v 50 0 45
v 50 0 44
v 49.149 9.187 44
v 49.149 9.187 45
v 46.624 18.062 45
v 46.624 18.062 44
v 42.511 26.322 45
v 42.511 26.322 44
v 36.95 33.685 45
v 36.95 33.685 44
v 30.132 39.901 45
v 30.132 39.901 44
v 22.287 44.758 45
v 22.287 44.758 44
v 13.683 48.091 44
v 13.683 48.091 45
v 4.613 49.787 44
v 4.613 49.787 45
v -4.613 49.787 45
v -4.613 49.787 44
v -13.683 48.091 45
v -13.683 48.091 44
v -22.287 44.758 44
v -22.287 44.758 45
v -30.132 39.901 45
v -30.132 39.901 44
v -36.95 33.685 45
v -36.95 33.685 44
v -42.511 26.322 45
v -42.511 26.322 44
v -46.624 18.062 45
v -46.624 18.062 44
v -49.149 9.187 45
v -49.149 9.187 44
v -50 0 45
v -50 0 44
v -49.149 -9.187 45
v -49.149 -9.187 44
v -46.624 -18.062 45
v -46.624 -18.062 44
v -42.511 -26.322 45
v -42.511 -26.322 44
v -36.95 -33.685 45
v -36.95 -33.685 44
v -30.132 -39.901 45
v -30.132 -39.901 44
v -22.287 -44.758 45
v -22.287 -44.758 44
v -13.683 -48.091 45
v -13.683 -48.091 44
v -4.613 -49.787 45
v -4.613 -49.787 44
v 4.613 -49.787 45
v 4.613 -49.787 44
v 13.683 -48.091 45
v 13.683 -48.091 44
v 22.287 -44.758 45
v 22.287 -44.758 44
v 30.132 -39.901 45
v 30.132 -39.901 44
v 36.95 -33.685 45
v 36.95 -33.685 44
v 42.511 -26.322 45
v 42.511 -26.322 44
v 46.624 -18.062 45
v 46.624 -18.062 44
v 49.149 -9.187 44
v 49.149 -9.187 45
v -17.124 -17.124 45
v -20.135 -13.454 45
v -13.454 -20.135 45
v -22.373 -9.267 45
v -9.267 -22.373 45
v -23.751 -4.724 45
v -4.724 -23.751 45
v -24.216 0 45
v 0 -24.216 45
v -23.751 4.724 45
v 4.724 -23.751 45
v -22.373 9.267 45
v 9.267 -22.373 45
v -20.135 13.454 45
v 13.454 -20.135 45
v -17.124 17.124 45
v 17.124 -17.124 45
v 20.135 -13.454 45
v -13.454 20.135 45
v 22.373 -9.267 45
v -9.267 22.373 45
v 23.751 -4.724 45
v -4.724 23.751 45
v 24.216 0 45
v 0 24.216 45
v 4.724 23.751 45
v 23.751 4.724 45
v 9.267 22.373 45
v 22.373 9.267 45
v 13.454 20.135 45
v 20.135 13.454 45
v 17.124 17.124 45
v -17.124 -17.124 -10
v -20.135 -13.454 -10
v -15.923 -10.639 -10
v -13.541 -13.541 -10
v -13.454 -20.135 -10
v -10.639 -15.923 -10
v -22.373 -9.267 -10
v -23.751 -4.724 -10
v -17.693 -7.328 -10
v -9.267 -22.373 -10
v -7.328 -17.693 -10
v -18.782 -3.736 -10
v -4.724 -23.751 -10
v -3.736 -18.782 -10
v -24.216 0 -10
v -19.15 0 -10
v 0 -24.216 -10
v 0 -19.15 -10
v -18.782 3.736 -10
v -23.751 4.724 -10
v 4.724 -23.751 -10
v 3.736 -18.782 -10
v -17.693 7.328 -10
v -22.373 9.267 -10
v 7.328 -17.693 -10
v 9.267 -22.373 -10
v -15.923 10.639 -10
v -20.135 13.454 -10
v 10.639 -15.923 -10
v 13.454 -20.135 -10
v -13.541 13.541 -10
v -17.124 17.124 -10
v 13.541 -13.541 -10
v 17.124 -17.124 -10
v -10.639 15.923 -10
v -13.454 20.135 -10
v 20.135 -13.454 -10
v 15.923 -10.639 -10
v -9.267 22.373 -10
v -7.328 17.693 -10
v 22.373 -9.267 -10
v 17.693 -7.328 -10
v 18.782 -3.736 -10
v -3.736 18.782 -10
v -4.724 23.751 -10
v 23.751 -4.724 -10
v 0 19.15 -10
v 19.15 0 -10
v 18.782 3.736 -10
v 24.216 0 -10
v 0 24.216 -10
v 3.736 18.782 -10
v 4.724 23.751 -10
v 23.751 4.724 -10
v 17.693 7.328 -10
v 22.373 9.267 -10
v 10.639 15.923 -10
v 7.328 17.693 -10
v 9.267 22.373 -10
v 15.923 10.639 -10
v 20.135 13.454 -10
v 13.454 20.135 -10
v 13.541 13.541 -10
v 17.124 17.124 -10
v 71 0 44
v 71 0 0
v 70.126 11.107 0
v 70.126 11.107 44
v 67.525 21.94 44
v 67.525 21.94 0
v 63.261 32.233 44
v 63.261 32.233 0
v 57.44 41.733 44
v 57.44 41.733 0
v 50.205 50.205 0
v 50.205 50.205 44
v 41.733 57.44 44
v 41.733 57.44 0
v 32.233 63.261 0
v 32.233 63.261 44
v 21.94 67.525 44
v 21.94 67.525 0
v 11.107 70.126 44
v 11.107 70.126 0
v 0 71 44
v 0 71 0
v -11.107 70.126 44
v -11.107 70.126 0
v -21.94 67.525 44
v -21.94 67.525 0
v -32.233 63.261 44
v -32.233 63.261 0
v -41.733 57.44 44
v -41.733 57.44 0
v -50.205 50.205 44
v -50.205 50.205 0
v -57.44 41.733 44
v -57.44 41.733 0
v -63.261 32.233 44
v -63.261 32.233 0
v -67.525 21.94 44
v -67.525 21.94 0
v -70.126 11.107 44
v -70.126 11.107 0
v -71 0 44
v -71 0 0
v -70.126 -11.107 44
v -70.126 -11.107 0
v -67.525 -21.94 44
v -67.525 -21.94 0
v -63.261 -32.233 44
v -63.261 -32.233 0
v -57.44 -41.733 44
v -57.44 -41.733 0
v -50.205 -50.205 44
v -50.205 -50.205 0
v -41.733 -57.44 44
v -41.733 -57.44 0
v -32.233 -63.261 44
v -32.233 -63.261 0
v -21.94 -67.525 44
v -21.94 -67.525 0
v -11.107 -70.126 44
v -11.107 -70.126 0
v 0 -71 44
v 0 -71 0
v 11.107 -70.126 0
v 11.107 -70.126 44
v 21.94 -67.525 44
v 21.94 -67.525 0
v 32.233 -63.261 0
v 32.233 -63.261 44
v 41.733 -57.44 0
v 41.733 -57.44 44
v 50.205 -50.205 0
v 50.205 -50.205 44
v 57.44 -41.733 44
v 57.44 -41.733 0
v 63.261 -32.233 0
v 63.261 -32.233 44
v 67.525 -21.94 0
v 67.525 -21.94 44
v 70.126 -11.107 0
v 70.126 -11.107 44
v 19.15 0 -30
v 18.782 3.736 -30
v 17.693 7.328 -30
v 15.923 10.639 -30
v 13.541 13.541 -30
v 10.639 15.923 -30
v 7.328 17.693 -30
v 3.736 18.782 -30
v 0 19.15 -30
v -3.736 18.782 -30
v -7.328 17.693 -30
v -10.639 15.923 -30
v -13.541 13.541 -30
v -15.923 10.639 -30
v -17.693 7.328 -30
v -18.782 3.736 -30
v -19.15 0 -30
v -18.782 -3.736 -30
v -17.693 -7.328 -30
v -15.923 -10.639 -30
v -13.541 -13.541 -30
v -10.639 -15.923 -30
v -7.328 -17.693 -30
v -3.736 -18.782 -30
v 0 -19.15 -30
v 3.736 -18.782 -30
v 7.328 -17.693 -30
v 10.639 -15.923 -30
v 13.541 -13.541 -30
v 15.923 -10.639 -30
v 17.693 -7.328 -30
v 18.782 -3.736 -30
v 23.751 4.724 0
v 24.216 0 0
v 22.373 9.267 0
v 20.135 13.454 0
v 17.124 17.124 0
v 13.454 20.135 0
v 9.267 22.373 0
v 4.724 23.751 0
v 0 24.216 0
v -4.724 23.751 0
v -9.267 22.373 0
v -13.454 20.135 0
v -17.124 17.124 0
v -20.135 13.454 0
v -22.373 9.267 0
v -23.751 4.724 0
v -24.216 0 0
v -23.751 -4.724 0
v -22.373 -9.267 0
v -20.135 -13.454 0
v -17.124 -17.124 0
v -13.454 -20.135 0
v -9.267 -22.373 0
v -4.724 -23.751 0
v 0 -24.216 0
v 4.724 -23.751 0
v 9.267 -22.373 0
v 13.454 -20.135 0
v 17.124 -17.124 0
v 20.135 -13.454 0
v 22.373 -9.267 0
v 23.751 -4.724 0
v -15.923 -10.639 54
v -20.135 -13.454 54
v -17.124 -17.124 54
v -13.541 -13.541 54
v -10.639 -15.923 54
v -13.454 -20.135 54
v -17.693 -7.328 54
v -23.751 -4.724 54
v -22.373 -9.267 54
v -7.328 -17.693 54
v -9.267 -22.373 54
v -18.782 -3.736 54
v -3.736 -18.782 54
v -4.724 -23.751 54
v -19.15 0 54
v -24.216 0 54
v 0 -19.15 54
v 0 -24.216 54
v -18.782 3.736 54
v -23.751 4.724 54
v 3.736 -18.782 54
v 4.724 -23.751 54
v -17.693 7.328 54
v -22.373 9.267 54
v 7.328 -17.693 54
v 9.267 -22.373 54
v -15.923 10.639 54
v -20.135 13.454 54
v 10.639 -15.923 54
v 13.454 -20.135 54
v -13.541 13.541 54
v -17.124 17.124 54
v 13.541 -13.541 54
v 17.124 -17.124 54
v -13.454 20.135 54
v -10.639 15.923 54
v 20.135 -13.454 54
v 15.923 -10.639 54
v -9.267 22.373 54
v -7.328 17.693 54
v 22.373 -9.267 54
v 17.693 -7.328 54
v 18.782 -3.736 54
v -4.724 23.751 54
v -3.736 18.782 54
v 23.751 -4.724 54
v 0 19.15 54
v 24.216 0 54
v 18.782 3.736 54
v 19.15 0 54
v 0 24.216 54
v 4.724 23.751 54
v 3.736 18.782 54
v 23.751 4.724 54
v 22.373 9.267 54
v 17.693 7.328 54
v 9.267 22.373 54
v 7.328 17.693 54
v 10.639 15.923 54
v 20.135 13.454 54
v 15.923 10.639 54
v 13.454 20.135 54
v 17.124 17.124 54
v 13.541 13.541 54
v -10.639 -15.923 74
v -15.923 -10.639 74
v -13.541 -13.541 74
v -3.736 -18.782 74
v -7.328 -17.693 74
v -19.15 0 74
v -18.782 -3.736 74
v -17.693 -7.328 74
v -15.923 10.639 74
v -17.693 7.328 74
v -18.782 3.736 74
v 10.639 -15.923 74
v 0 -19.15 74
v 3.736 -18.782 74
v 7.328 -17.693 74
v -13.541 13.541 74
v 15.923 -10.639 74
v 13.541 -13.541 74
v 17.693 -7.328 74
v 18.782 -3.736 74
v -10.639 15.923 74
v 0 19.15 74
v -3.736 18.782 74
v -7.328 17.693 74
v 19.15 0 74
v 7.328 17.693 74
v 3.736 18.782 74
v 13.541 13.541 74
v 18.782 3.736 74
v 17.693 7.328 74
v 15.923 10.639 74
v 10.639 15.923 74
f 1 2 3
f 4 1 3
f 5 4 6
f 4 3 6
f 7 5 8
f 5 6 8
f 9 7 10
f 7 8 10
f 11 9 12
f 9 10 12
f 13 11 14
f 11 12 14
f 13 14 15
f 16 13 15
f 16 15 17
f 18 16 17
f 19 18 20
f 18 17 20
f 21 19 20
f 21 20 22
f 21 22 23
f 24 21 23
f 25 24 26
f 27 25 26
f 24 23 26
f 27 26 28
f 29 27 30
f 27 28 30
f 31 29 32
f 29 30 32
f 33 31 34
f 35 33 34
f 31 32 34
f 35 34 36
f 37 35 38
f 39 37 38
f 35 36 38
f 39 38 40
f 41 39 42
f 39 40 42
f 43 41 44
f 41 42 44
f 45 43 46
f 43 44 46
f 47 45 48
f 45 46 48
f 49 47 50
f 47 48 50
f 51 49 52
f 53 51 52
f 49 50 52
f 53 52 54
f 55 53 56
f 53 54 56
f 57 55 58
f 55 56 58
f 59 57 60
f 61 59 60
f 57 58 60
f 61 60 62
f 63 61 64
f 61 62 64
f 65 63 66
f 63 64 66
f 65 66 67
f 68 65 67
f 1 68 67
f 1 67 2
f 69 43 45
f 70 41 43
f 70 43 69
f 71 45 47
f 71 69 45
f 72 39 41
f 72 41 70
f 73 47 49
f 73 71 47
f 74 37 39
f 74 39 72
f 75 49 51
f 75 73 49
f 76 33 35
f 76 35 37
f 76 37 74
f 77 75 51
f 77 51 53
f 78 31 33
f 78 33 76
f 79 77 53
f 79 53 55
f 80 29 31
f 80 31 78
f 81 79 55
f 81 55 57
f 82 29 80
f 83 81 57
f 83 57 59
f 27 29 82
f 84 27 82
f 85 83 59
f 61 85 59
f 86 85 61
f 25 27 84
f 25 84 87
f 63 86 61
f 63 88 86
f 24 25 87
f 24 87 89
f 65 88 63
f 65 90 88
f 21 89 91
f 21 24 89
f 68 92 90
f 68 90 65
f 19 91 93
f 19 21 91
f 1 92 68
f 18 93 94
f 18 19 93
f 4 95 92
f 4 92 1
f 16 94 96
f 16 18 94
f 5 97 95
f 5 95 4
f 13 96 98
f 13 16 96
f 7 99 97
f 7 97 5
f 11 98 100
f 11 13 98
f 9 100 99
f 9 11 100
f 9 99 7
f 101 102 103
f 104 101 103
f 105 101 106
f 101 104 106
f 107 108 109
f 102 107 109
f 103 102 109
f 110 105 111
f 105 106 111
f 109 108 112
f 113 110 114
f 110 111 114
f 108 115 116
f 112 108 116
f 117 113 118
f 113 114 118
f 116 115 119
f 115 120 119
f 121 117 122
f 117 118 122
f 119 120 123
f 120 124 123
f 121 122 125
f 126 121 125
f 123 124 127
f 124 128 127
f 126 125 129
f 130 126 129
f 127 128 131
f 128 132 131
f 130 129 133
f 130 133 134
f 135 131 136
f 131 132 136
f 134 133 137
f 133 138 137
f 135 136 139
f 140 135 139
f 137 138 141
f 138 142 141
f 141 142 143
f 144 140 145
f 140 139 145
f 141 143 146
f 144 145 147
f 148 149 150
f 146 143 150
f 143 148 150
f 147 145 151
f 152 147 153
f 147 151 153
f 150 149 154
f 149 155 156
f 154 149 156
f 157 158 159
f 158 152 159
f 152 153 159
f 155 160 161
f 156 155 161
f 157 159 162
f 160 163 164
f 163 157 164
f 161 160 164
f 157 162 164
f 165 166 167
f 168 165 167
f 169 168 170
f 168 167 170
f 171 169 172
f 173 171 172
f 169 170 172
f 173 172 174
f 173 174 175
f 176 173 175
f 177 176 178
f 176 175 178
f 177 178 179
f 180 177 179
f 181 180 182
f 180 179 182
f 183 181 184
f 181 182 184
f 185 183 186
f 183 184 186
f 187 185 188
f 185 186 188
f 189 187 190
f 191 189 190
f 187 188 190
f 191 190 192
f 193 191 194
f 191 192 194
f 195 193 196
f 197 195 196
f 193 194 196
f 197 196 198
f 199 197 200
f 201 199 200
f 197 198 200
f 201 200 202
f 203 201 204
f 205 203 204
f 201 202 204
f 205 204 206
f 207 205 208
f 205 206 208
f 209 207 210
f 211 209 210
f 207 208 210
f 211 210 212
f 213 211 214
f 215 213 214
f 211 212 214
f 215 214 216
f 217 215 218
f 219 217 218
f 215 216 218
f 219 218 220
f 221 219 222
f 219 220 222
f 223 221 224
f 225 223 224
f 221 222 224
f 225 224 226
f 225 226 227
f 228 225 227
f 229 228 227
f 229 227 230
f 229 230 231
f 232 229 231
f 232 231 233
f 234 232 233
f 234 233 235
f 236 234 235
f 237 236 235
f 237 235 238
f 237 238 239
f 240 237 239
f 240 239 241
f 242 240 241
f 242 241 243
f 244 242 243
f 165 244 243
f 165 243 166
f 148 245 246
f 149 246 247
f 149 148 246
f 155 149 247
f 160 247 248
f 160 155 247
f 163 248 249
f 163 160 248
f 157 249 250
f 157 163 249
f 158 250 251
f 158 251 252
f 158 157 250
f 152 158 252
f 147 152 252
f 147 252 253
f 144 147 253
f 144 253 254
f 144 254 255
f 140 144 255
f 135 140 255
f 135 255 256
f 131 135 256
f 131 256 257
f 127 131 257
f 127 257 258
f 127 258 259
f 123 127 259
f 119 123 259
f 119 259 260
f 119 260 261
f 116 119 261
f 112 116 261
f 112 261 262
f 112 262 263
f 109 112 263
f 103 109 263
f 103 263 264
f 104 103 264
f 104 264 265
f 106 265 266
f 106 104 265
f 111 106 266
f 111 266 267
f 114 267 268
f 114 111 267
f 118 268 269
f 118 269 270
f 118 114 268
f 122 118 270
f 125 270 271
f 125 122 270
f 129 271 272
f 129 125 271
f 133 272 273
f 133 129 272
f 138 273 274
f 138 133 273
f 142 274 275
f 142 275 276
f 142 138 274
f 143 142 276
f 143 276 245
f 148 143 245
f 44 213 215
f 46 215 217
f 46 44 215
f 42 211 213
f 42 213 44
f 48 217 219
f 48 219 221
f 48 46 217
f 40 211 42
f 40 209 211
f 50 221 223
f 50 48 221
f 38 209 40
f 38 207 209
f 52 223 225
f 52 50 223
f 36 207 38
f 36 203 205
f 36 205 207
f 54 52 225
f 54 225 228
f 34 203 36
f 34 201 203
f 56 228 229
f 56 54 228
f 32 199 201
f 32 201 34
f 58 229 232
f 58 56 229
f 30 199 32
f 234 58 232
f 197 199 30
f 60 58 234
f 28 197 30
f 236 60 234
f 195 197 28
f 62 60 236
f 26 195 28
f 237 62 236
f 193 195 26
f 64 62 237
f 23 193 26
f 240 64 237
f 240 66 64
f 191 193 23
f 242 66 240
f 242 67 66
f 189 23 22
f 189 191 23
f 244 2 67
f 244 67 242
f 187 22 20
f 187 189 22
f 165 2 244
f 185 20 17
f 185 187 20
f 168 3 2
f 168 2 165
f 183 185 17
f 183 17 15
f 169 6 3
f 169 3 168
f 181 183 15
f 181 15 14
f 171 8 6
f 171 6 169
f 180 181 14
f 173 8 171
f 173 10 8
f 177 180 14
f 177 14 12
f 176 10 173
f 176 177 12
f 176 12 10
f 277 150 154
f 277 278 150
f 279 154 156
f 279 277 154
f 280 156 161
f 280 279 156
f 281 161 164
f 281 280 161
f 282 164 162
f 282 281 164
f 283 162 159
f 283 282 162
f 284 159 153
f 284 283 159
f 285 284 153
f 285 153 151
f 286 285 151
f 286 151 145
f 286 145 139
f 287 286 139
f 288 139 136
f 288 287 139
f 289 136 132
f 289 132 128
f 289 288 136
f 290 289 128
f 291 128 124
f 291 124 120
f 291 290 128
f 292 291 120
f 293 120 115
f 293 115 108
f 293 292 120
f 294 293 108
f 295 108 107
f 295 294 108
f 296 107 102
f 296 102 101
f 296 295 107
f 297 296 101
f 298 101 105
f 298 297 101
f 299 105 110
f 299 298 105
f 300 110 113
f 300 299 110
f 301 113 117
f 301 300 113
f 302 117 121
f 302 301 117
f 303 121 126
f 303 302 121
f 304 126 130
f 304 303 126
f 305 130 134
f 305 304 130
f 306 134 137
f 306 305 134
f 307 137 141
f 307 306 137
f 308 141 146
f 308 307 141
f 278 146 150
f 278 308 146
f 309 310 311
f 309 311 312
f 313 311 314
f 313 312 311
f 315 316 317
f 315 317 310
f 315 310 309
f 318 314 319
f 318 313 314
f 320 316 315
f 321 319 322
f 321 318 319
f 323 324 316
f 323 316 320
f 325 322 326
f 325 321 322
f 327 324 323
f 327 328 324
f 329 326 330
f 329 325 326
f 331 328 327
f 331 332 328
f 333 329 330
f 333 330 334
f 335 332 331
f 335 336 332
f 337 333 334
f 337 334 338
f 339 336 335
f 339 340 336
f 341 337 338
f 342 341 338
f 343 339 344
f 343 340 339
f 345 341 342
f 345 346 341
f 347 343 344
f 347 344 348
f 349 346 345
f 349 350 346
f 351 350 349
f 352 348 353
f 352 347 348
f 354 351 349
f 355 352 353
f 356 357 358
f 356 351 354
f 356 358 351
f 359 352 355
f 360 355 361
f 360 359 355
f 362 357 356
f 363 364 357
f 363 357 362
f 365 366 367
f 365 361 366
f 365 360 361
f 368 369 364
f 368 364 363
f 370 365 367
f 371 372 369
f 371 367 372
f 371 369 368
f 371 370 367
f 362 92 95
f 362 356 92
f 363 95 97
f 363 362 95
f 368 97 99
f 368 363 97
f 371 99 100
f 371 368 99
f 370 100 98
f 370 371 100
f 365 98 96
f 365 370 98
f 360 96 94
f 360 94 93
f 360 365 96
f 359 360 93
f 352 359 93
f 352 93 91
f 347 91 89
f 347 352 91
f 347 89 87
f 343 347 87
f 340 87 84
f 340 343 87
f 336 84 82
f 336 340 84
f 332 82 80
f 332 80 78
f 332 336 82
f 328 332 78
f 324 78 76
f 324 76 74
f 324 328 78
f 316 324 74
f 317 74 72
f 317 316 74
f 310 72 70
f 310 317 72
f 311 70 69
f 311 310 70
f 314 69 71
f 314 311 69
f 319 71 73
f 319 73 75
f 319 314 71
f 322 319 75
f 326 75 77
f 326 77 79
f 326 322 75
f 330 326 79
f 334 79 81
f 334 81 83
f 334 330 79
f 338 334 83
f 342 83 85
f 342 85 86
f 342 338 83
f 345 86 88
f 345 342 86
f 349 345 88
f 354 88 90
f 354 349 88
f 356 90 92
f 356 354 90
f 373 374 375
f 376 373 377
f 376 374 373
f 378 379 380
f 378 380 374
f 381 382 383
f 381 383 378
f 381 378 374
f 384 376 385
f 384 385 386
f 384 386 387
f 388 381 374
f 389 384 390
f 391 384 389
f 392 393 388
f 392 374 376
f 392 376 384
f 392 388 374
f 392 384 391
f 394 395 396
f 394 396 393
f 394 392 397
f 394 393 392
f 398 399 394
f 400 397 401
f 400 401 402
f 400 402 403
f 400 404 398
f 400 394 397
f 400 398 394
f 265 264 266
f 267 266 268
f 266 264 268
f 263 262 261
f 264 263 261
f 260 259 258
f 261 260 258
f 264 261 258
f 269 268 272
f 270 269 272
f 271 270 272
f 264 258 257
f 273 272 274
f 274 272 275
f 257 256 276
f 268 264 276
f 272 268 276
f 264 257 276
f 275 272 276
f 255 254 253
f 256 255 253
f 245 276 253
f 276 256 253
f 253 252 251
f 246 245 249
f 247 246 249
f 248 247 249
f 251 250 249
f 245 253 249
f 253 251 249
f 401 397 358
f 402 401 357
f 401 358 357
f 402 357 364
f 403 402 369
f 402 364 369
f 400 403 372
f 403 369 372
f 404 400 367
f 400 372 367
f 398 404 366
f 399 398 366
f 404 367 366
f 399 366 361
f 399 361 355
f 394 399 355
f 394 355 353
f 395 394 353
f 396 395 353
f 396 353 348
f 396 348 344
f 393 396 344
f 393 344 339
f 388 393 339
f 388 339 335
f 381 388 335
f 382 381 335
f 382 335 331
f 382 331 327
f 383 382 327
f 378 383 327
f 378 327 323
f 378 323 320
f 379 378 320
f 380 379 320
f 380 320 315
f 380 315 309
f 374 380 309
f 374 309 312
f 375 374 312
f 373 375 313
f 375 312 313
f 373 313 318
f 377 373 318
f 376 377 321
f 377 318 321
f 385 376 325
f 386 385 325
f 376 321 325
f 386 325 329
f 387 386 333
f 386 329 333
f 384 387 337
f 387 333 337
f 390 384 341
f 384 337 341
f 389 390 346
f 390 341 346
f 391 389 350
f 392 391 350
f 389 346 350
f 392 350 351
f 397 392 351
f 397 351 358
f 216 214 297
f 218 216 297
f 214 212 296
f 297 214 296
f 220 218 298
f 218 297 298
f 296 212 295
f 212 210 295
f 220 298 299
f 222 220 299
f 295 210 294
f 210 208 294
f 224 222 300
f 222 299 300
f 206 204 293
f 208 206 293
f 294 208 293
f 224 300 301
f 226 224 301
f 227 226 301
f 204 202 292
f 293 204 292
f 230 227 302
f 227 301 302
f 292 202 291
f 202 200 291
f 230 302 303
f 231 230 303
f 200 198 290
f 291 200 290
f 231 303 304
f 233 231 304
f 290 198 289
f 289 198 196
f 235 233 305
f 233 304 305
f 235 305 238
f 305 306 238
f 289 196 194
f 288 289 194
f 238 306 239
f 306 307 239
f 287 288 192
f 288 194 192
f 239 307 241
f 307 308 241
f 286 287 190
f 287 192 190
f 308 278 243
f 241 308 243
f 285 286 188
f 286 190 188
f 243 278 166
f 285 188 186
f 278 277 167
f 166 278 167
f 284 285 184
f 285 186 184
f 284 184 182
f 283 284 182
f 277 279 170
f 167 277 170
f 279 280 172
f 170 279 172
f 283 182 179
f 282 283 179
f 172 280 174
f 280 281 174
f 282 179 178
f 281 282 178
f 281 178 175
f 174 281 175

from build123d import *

# Parameters (mm, degrees)
SKETCH1_R                = 71
SKETCH1_R_2              = 50
BOSS_EXTRUDE1_DEPTH      = 44
SKETCH2_R                = 24.216288289
SKETCH2_R_2              = 19.150259362
BOSS_EXTRUDE2_DEPTH      = 54
BOSS_EXTRUDE2_DEPTH_BACK = 10
SKETCH3_R                = 19.150259362
BOSS_EXTRUDE3_DEPTH      = 30
SKETCH4_R                = 19.150259362
BOSS_EXTRUDE4_DEPTH      = 74
SKETCH7_R                = 50
BOSS_EXTRUDE5_DEPTH      = 1
BOSS_EXTRUDE5_DEPTH_BACK = 44


with BuildPart() as part:
    # Sketch1 → Boss-Extrude1 (new body)
    with BuildSketch(Plane.XY):
        Circle(SKETCH1_R)
        Circle(SKETCH1_R_2, mode=Mode.SUBTRACT)
    extrude(amount=BOSS_EXTRUDE1_DEPTH)



with BuildPart() as body_2:
    # Sketch2 → Boss-Extrude2 (new body, two sides)
    with BuildSketch(Plane.XY) as boss_extrude2_sk:
        Circle(SKETCH2_R)
        Circle(SKETCH2_R_2, mode=Mode.SUBTRACT)
    extrude(amount=BOSS_EXTRUDE2_DEPTH)
    extrude(boss_extrude2_sk.sketch, amount=-BOSS_EXTRUDE2_DEPTH_BACK)


with BuildPart() as body_3:
    # Sketch3 → Boss-Extrude3 (new body)
    with BuildSketch(Plane.XY):
        Circle(SKETCH3_R)
    extrude(amount=-BOSS_EXTRUDE3_DEPTH)


with BuildPart() as body_4:
    # Sketch4 → Boss-Extrude4 (new body)
    with BuildSketch(Plane.XY):
        Circle(SKETCH4_R)
    extrude(amount=BOSS_EXTRUDE4_DEPTH)


with BuildPart() as part_1:
    add(part.part)

    add(body_2.part)  # Boss-Extrude5 merges body 2

    add(body_3.part)  # Boss-Extrude5 merges body 3

    add(body_4.part)  # Boss-Extrude5 merges body 4
    # Sketch7 → Boss-Extrude5 (add, two sides)
    with BuildSketch(Plane.XY.offset(44)) as boss_extrude5_sk:
        Circle(SKETCH7_R)
    extrude(amount=BOSS_EXTRUDE5_DEPTH)
    extrude(boss_extrude5_sk.sketch, amount=-BOSS_EXTRUDE5_DEPTH_BACK)


solid = part_1.part
